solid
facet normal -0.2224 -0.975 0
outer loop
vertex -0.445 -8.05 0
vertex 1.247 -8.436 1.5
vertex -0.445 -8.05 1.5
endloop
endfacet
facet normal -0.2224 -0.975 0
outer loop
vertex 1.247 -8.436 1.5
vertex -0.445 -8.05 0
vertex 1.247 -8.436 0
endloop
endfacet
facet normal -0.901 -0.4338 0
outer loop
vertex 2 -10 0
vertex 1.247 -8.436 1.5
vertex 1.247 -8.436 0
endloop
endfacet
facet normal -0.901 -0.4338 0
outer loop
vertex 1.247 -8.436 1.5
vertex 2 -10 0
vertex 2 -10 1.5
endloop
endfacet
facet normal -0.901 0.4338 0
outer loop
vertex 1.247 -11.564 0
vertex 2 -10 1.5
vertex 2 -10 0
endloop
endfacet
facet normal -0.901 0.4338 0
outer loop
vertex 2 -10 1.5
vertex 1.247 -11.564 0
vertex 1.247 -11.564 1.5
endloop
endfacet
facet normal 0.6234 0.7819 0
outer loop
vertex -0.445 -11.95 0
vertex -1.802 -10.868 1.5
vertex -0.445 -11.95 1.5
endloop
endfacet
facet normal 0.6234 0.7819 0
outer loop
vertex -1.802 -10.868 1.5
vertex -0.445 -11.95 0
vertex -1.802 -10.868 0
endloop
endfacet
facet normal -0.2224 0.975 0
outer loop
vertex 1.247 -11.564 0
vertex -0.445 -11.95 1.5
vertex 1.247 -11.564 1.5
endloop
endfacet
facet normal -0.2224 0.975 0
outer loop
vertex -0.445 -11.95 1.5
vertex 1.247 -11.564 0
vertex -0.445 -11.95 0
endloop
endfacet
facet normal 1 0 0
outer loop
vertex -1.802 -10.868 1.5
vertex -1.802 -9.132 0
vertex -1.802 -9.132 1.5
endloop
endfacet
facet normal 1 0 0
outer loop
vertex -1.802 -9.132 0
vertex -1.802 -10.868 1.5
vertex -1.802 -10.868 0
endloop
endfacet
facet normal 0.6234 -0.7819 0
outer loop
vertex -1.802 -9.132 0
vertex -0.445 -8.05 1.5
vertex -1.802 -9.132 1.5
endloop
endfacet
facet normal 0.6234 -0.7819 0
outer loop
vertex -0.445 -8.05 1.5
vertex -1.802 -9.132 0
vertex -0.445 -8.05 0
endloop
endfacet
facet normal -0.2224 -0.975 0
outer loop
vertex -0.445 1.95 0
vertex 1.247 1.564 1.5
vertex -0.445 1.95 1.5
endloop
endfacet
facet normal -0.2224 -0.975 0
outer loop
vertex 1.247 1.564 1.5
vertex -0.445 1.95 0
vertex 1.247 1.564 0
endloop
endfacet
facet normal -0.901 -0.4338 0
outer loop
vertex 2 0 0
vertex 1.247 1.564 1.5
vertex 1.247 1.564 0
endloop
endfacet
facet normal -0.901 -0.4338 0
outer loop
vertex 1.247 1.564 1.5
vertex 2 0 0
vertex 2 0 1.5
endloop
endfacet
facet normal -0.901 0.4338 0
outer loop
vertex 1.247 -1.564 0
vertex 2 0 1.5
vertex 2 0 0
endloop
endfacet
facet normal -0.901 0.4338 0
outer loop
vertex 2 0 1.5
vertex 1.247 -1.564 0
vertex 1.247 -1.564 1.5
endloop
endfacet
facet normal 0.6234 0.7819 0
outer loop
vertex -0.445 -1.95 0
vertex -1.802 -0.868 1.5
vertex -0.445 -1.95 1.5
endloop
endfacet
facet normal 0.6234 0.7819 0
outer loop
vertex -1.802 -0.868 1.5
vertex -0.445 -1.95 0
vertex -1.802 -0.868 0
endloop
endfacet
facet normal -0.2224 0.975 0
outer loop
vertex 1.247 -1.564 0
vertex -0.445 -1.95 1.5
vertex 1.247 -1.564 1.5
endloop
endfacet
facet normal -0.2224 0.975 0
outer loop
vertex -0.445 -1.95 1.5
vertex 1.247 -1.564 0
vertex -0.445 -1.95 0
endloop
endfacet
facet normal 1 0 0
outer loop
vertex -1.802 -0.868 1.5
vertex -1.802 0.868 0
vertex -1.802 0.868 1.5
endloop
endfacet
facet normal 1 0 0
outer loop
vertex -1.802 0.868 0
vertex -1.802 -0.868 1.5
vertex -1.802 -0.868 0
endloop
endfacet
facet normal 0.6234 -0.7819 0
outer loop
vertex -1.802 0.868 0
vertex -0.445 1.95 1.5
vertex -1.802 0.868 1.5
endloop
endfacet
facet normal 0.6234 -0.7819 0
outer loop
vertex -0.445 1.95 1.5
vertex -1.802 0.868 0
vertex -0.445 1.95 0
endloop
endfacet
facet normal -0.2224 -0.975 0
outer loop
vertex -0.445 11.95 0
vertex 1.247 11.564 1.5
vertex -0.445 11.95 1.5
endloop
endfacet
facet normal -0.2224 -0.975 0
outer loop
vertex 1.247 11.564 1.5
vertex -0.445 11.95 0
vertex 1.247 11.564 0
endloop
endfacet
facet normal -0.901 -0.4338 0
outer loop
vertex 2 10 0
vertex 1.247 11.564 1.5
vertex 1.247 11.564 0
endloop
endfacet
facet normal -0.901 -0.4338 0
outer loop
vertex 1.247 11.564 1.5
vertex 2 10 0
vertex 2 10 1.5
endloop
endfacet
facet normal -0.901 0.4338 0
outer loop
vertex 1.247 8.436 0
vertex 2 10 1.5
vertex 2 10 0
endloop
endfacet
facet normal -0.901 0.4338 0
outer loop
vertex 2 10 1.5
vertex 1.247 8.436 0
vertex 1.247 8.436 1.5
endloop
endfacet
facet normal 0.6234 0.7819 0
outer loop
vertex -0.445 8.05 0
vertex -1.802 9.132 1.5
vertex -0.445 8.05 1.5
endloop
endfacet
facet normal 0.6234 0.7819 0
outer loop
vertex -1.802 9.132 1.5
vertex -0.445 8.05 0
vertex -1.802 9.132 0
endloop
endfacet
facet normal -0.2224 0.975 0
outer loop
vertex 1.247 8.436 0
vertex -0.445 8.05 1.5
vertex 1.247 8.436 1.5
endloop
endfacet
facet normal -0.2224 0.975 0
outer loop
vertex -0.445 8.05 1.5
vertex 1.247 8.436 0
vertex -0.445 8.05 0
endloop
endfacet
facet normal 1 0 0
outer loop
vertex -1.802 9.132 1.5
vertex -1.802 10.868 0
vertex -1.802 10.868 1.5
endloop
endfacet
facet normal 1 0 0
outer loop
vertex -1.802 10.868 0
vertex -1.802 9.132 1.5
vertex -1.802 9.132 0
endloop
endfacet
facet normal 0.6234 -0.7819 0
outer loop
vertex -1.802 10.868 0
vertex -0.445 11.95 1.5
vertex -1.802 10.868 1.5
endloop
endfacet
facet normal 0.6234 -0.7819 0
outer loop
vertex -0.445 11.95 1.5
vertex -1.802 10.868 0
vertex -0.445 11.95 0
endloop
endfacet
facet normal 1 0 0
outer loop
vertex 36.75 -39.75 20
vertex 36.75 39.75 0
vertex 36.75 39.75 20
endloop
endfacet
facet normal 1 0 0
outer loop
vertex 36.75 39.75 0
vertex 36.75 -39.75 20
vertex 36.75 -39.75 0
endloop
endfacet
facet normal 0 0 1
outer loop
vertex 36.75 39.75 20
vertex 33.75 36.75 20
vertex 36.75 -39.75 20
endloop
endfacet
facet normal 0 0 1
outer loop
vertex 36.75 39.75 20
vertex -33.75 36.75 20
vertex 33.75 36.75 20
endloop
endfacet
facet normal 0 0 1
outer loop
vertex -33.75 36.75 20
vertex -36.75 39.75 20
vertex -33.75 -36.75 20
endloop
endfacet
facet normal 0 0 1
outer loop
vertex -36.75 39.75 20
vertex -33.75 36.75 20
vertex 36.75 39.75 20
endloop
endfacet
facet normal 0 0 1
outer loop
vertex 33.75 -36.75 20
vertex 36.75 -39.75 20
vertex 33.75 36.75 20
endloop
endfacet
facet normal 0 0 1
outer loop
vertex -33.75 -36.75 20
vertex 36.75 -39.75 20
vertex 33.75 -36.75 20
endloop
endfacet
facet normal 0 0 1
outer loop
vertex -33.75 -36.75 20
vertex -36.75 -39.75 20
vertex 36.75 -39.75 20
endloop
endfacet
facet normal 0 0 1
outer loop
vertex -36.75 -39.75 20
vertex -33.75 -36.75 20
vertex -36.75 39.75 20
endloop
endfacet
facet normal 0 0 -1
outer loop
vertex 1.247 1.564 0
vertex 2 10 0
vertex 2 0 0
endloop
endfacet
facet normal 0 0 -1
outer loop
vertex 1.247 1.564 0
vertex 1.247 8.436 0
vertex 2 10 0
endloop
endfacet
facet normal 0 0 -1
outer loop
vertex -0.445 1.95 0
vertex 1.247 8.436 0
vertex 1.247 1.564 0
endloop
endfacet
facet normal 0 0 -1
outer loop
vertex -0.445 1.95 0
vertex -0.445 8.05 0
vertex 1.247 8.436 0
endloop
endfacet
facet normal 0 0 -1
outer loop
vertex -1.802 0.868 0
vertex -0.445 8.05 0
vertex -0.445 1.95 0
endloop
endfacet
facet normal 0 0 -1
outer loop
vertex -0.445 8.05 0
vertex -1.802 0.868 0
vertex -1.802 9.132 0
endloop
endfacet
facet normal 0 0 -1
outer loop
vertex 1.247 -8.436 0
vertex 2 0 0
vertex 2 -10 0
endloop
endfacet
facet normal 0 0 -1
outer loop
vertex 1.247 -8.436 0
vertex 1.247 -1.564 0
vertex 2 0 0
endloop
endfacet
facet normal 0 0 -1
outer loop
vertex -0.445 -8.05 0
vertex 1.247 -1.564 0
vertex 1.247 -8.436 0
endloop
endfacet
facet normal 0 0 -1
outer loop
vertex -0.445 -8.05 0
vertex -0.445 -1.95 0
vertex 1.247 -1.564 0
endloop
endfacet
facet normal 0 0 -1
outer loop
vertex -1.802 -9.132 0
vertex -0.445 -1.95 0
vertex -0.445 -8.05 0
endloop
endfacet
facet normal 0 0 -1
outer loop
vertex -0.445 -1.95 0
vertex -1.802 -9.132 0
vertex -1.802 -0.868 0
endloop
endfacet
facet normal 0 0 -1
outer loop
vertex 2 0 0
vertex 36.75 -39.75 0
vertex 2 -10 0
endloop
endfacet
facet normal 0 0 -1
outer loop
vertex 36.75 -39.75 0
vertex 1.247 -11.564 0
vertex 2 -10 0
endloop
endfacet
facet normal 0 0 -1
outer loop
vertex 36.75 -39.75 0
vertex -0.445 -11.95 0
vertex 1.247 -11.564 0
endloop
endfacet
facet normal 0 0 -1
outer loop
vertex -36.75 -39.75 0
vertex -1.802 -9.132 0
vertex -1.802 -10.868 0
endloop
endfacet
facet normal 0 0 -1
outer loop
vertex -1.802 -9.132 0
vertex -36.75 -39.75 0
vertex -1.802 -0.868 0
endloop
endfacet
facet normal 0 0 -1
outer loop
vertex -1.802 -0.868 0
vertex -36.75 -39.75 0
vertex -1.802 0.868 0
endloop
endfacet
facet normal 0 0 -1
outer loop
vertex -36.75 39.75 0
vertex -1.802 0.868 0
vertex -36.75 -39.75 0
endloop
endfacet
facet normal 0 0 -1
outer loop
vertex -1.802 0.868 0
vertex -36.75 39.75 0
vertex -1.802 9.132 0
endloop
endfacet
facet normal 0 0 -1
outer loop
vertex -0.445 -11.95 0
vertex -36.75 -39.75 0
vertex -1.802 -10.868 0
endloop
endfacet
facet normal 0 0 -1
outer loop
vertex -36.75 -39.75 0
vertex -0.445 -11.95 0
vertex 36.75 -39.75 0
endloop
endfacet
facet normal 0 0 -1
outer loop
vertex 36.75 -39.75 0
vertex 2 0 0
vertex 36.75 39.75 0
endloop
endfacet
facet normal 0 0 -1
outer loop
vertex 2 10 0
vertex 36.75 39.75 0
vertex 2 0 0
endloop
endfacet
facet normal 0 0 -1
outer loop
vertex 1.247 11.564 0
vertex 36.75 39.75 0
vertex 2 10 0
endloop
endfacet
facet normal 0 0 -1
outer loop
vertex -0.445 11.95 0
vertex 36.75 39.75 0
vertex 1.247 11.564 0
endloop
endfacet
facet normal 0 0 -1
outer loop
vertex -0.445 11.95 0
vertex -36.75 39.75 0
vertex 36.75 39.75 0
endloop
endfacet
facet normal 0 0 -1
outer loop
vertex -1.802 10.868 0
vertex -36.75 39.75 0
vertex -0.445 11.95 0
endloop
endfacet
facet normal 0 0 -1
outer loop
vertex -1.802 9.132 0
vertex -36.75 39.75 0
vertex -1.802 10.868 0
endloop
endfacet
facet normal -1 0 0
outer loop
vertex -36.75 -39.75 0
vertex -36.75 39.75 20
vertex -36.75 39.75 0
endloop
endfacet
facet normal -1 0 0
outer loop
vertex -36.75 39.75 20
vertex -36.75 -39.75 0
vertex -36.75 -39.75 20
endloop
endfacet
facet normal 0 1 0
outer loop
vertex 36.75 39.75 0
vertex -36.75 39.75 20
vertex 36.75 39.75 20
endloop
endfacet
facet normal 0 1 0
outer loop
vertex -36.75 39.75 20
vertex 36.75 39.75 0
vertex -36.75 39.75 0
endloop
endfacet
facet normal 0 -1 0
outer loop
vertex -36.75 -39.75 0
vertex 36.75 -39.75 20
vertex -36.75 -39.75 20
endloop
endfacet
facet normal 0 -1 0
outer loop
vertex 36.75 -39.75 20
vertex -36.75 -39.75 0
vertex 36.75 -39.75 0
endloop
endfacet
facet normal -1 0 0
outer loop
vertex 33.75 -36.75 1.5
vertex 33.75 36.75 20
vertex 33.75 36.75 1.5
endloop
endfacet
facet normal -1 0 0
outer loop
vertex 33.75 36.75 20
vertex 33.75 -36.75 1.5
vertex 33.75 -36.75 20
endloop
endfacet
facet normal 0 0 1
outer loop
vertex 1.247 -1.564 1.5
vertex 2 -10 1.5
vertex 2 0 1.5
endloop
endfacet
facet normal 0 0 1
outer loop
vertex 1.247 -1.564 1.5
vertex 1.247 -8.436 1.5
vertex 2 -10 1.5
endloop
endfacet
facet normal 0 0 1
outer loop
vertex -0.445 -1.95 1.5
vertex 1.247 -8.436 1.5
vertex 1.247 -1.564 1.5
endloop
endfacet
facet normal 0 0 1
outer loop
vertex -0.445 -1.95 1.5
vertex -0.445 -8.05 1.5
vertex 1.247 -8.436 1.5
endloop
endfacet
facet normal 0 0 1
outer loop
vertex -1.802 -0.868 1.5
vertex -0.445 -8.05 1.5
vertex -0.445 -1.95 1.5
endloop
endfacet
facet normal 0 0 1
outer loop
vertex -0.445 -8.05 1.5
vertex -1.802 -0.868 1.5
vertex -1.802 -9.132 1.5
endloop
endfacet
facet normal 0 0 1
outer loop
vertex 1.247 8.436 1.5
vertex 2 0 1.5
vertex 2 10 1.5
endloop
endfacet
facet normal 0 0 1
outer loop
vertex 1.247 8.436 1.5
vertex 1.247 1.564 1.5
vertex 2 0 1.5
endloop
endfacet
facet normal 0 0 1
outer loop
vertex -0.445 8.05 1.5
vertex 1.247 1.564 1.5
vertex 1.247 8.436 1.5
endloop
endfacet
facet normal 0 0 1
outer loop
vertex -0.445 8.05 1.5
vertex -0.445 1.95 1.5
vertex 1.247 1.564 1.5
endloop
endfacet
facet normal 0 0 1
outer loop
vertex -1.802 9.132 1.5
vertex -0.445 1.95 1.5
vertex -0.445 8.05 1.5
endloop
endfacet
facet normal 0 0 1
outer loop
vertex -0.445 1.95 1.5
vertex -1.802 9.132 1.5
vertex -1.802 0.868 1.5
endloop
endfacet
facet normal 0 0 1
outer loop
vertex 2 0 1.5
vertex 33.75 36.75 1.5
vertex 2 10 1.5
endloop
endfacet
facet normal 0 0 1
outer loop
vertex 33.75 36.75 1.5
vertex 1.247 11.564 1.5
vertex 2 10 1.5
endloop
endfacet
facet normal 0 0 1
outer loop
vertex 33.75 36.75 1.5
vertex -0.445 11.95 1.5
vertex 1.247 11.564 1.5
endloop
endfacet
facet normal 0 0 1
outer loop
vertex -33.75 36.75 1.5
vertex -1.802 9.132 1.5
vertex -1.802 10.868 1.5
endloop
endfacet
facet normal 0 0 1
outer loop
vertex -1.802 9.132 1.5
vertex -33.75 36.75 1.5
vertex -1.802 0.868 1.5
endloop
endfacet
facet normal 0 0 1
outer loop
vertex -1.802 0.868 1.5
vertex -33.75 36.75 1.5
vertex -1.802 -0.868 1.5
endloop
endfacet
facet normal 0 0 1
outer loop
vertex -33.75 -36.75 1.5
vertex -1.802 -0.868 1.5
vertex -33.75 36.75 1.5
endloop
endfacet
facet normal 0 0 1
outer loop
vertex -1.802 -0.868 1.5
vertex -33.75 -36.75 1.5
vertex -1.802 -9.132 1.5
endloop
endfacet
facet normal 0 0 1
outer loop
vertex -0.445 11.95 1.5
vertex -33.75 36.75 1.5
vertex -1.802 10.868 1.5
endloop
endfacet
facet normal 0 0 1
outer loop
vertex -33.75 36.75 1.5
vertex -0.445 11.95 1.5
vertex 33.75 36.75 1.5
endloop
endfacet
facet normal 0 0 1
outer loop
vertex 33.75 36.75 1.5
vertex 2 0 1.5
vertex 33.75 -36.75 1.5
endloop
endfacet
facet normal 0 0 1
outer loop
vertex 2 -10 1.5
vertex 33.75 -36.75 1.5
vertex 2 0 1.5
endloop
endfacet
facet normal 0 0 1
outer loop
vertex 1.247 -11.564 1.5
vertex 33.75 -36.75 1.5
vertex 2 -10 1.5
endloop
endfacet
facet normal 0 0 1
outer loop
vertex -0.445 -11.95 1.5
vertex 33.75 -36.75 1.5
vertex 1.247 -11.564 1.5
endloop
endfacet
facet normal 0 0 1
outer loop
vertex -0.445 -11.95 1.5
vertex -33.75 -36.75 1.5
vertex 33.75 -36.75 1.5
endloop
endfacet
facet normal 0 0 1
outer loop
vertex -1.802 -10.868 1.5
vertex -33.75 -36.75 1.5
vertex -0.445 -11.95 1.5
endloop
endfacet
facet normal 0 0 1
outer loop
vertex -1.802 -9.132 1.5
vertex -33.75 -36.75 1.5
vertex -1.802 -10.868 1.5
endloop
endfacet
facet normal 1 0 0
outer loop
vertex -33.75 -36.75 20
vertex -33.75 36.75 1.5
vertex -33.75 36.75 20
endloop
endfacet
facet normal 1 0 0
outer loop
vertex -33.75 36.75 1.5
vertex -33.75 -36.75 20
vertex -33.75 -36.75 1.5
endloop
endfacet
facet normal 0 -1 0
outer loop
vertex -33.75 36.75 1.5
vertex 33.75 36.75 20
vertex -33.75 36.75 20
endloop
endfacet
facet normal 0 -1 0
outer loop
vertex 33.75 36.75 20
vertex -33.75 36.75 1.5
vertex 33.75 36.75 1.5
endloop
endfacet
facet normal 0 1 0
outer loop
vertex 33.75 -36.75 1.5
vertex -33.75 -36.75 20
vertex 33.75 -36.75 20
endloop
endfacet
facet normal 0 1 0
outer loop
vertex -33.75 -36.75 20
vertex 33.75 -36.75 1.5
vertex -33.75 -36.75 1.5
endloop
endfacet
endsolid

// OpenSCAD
containerHeight = 20;

padding = 0;
batteryBoxWidth = 67.5 + padding;
batteryBoxLength = 73.5 + padding;

baseThickness = 1.5;
wallThickness = 3;

containerWidth = batteryBoxWidth + wallThickness * 2;
echo(containerWidth);
containerLength = batteryBoxLength + wallThickness * 2;
echo(containerLength);
holeDiameter = 4;

screwLength = 16;
tslotHeight = screwLength - wallThickness;
tslotNutWidth = 5;
tslotNutHeight = 3;

translate([-containerWidth/2, -containerLength/2, 0])
difference() {
	cube([containerWidth, containerLength, containerHeight]);
	translate([wallThickness,wallThickness,baseThickness])
	#cube([batteryBoxWidth, batteryBoxLength, containerHeight]);

	// Swiss cheesing
    for (i = [containerWidth/2]) {
    //for (i = [containerWidth/2 - 10, containerWidth/2, containerWidth/2 + 10]) {
      for (j = [containerLength/2 - 10, containerLength/2, containerLength/2 + 10]) {
         translate([i, j, baseThickness/-2])
           #cylinder(r=holeDiameter/2, h=baseThickness*2);
      } 
    }

	// t-slots

	//for (i = [-wallThickness/2, containerWidth - wallThickness*1.5]) {
	//	for (j = [holeDiameter, containerLength - holeDiameter *2 - wallThickness * 2]) {
	//		translate([i, j + wallThickness, containerHeight-tslotHeight])
	//			#cube([wallThickness*2, holeDiameter, tslotHeight]);
	//		translate([i, j - holeDiameter/2 + wallThickness, containerHeight-tslotHeight])
	//			#cube([wallThickness*2, holeDiameter*2, tslotNutHeight]);
	//  	}
	//}

}
